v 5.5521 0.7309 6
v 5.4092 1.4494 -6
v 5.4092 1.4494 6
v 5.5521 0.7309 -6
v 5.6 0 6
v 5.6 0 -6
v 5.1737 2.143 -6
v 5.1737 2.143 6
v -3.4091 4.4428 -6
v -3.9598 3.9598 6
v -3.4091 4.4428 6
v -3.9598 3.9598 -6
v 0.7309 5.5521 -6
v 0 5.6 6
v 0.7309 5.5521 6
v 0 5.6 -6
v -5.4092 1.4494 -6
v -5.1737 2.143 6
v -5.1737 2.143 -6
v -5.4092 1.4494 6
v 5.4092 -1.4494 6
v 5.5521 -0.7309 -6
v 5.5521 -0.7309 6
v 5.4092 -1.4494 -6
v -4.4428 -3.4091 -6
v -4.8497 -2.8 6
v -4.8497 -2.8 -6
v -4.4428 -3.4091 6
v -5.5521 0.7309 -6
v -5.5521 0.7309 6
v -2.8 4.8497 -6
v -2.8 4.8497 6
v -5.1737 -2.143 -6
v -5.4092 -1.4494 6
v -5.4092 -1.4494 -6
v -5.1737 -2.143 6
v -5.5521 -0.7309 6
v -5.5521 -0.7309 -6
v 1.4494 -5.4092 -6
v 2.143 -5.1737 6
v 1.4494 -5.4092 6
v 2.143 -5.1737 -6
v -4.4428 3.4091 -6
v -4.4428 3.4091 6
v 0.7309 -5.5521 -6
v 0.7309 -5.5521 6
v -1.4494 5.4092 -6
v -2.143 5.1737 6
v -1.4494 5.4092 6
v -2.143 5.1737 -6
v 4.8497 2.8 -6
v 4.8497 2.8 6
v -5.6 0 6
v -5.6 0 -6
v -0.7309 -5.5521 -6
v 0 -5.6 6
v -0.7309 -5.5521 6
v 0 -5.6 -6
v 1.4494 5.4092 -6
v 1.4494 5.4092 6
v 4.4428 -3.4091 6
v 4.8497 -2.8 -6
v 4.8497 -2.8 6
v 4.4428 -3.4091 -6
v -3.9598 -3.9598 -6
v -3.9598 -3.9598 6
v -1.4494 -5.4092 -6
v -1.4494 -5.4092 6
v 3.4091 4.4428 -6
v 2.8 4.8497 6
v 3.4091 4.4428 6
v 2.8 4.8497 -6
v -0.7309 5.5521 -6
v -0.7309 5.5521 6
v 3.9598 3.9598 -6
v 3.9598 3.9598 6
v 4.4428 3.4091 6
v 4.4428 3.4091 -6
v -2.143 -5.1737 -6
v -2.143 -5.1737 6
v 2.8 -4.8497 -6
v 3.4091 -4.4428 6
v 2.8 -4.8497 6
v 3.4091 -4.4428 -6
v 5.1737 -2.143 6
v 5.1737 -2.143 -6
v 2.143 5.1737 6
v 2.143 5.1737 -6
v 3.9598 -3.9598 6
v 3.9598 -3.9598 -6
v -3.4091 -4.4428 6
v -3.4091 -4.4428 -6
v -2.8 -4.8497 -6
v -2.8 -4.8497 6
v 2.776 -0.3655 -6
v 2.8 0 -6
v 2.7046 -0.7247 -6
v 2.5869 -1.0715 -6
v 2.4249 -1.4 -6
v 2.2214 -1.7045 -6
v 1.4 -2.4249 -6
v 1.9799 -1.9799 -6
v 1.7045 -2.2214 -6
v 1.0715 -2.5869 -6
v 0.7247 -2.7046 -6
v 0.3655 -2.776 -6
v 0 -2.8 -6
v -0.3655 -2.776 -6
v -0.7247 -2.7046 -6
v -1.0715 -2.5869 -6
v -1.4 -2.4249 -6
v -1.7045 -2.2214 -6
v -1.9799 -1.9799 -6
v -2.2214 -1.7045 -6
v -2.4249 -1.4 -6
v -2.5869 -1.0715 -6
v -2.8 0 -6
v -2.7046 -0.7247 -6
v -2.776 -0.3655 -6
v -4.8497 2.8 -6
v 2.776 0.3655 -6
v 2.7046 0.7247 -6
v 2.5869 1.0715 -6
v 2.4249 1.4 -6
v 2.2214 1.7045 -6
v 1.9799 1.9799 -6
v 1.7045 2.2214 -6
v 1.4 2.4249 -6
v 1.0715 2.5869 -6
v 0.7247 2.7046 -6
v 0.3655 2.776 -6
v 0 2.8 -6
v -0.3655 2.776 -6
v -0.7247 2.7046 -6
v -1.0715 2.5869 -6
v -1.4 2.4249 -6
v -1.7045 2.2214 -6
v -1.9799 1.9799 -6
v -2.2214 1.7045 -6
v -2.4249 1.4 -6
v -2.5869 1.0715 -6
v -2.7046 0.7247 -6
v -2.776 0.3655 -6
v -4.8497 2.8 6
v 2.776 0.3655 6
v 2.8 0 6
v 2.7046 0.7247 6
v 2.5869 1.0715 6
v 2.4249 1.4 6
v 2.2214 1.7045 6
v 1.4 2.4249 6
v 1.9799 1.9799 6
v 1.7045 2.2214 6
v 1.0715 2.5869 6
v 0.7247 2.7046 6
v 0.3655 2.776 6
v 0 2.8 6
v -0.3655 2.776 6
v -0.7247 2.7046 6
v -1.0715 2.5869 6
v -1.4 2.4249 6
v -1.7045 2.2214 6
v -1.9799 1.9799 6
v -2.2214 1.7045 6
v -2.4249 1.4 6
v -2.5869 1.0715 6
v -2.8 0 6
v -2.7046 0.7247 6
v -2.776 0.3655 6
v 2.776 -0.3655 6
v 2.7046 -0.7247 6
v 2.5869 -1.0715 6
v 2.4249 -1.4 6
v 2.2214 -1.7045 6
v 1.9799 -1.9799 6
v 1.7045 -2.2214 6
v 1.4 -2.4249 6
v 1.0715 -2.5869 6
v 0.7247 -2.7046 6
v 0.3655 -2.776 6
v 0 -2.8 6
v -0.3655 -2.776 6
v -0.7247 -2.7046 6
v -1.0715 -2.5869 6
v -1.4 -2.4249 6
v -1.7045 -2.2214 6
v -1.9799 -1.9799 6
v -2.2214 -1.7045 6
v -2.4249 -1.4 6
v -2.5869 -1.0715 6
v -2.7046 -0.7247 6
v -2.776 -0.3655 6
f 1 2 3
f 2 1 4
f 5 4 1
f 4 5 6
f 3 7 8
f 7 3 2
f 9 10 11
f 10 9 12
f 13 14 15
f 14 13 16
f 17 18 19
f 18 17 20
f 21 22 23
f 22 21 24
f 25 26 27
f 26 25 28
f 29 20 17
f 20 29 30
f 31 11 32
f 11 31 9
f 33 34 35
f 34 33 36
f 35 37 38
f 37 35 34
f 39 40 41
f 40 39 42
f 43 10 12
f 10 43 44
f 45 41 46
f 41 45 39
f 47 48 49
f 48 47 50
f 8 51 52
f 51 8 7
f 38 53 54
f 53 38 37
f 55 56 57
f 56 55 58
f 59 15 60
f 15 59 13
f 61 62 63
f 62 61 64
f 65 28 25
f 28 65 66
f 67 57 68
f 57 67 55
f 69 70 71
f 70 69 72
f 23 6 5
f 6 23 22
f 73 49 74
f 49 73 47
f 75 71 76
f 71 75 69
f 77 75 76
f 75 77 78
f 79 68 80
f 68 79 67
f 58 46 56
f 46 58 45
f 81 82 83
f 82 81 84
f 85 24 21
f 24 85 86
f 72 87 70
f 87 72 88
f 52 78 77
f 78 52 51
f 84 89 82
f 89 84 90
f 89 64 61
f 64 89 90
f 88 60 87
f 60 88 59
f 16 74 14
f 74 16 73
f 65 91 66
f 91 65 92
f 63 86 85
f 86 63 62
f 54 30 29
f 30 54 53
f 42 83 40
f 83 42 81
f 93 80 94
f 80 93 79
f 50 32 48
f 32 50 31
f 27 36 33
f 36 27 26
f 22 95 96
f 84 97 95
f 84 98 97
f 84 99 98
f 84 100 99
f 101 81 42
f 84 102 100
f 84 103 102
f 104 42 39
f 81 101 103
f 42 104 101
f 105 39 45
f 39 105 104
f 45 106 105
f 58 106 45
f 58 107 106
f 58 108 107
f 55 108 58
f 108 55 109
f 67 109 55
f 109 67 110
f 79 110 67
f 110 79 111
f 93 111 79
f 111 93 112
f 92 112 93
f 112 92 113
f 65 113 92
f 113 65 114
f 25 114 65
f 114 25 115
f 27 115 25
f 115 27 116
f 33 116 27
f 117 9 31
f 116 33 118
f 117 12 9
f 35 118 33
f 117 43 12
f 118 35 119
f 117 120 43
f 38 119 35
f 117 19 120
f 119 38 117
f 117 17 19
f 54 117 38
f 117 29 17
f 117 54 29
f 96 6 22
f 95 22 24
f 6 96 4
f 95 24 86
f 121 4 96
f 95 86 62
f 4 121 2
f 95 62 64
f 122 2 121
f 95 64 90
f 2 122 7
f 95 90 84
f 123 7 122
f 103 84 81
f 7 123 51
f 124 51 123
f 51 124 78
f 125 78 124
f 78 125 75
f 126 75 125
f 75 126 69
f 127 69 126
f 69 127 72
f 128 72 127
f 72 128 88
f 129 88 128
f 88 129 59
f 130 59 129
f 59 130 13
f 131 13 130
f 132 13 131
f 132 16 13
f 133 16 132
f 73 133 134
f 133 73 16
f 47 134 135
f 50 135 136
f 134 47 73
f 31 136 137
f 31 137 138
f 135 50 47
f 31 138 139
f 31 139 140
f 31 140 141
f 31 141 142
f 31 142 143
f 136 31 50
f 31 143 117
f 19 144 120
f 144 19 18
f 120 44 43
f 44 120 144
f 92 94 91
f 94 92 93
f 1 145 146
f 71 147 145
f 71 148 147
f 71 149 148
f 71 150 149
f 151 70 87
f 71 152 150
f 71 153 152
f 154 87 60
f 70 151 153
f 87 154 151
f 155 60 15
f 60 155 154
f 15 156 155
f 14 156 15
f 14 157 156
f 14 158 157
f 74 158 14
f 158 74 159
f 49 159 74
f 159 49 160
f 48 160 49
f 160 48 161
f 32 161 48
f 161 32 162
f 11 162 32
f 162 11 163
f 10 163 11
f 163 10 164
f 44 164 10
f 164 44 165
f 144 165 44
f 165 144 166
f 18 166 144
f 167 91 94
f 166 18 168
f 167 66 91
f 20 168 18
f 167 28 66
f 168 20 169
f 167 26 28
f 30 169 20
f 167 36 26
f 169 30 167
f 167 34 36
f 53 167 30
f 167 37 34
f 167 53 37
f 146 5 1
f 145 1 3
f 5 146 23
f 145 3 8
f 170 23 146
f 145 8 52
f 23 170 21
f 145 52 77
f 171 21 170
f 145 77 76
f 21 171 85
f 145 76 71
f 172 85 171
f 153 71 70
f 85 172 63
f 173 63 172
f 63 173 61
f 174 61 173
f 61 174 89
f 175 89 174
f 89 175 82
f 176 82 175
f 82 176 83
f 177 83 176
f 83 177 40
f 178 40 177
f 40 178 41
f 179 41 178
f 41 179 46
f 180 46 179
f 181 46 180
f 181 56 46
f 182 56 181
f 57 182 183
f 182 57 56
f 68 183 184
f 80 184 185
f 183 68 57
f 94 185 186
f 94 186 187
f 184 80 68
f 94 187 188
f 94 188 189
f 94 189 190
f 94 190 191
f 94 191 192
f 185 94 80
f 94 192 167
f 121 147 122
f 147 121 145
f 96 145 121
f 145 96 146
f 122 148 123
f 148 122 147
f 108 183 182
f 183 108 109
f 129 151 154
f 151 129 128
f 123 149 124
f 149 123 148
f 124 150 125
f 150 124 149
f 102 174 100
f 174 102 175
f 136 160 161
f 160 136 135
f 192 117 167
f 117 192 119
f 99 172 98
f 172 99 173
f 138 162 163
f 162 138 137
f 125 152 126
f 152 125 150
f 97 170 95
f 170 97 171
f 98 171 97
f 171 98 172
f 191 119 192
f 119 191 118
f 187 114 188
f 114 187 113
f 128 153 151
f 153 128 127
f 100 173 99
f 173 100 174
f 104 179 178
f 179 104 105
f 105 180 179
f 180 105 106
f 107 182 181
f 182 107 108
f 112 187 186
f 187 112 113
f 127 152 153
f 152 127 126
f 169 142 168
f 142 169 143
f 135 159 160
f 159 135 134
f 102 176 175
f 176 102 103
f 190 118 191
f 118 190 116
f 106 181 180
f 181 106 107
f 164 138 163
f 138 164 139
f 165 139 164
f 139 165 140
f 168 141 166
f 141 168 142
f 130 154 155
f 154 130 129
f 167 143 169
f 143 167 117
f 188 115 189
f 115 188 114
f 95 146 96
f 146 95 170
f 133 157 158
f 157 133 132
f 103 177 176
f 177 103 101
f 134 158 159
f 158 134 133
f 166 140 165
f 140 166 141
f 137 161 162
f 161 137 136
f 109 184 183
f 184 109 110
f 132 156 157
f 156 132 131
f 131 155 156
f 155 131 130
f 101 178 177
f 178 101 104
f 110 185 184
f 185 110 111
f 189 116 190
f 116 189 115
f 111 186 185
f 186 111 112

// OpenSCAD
difference()
{
cylinder(h=12,d=5.6+5.6,center=true,$fn=48);
cylinder(h=14,d=5.6,center=true,$fn=48);
}
